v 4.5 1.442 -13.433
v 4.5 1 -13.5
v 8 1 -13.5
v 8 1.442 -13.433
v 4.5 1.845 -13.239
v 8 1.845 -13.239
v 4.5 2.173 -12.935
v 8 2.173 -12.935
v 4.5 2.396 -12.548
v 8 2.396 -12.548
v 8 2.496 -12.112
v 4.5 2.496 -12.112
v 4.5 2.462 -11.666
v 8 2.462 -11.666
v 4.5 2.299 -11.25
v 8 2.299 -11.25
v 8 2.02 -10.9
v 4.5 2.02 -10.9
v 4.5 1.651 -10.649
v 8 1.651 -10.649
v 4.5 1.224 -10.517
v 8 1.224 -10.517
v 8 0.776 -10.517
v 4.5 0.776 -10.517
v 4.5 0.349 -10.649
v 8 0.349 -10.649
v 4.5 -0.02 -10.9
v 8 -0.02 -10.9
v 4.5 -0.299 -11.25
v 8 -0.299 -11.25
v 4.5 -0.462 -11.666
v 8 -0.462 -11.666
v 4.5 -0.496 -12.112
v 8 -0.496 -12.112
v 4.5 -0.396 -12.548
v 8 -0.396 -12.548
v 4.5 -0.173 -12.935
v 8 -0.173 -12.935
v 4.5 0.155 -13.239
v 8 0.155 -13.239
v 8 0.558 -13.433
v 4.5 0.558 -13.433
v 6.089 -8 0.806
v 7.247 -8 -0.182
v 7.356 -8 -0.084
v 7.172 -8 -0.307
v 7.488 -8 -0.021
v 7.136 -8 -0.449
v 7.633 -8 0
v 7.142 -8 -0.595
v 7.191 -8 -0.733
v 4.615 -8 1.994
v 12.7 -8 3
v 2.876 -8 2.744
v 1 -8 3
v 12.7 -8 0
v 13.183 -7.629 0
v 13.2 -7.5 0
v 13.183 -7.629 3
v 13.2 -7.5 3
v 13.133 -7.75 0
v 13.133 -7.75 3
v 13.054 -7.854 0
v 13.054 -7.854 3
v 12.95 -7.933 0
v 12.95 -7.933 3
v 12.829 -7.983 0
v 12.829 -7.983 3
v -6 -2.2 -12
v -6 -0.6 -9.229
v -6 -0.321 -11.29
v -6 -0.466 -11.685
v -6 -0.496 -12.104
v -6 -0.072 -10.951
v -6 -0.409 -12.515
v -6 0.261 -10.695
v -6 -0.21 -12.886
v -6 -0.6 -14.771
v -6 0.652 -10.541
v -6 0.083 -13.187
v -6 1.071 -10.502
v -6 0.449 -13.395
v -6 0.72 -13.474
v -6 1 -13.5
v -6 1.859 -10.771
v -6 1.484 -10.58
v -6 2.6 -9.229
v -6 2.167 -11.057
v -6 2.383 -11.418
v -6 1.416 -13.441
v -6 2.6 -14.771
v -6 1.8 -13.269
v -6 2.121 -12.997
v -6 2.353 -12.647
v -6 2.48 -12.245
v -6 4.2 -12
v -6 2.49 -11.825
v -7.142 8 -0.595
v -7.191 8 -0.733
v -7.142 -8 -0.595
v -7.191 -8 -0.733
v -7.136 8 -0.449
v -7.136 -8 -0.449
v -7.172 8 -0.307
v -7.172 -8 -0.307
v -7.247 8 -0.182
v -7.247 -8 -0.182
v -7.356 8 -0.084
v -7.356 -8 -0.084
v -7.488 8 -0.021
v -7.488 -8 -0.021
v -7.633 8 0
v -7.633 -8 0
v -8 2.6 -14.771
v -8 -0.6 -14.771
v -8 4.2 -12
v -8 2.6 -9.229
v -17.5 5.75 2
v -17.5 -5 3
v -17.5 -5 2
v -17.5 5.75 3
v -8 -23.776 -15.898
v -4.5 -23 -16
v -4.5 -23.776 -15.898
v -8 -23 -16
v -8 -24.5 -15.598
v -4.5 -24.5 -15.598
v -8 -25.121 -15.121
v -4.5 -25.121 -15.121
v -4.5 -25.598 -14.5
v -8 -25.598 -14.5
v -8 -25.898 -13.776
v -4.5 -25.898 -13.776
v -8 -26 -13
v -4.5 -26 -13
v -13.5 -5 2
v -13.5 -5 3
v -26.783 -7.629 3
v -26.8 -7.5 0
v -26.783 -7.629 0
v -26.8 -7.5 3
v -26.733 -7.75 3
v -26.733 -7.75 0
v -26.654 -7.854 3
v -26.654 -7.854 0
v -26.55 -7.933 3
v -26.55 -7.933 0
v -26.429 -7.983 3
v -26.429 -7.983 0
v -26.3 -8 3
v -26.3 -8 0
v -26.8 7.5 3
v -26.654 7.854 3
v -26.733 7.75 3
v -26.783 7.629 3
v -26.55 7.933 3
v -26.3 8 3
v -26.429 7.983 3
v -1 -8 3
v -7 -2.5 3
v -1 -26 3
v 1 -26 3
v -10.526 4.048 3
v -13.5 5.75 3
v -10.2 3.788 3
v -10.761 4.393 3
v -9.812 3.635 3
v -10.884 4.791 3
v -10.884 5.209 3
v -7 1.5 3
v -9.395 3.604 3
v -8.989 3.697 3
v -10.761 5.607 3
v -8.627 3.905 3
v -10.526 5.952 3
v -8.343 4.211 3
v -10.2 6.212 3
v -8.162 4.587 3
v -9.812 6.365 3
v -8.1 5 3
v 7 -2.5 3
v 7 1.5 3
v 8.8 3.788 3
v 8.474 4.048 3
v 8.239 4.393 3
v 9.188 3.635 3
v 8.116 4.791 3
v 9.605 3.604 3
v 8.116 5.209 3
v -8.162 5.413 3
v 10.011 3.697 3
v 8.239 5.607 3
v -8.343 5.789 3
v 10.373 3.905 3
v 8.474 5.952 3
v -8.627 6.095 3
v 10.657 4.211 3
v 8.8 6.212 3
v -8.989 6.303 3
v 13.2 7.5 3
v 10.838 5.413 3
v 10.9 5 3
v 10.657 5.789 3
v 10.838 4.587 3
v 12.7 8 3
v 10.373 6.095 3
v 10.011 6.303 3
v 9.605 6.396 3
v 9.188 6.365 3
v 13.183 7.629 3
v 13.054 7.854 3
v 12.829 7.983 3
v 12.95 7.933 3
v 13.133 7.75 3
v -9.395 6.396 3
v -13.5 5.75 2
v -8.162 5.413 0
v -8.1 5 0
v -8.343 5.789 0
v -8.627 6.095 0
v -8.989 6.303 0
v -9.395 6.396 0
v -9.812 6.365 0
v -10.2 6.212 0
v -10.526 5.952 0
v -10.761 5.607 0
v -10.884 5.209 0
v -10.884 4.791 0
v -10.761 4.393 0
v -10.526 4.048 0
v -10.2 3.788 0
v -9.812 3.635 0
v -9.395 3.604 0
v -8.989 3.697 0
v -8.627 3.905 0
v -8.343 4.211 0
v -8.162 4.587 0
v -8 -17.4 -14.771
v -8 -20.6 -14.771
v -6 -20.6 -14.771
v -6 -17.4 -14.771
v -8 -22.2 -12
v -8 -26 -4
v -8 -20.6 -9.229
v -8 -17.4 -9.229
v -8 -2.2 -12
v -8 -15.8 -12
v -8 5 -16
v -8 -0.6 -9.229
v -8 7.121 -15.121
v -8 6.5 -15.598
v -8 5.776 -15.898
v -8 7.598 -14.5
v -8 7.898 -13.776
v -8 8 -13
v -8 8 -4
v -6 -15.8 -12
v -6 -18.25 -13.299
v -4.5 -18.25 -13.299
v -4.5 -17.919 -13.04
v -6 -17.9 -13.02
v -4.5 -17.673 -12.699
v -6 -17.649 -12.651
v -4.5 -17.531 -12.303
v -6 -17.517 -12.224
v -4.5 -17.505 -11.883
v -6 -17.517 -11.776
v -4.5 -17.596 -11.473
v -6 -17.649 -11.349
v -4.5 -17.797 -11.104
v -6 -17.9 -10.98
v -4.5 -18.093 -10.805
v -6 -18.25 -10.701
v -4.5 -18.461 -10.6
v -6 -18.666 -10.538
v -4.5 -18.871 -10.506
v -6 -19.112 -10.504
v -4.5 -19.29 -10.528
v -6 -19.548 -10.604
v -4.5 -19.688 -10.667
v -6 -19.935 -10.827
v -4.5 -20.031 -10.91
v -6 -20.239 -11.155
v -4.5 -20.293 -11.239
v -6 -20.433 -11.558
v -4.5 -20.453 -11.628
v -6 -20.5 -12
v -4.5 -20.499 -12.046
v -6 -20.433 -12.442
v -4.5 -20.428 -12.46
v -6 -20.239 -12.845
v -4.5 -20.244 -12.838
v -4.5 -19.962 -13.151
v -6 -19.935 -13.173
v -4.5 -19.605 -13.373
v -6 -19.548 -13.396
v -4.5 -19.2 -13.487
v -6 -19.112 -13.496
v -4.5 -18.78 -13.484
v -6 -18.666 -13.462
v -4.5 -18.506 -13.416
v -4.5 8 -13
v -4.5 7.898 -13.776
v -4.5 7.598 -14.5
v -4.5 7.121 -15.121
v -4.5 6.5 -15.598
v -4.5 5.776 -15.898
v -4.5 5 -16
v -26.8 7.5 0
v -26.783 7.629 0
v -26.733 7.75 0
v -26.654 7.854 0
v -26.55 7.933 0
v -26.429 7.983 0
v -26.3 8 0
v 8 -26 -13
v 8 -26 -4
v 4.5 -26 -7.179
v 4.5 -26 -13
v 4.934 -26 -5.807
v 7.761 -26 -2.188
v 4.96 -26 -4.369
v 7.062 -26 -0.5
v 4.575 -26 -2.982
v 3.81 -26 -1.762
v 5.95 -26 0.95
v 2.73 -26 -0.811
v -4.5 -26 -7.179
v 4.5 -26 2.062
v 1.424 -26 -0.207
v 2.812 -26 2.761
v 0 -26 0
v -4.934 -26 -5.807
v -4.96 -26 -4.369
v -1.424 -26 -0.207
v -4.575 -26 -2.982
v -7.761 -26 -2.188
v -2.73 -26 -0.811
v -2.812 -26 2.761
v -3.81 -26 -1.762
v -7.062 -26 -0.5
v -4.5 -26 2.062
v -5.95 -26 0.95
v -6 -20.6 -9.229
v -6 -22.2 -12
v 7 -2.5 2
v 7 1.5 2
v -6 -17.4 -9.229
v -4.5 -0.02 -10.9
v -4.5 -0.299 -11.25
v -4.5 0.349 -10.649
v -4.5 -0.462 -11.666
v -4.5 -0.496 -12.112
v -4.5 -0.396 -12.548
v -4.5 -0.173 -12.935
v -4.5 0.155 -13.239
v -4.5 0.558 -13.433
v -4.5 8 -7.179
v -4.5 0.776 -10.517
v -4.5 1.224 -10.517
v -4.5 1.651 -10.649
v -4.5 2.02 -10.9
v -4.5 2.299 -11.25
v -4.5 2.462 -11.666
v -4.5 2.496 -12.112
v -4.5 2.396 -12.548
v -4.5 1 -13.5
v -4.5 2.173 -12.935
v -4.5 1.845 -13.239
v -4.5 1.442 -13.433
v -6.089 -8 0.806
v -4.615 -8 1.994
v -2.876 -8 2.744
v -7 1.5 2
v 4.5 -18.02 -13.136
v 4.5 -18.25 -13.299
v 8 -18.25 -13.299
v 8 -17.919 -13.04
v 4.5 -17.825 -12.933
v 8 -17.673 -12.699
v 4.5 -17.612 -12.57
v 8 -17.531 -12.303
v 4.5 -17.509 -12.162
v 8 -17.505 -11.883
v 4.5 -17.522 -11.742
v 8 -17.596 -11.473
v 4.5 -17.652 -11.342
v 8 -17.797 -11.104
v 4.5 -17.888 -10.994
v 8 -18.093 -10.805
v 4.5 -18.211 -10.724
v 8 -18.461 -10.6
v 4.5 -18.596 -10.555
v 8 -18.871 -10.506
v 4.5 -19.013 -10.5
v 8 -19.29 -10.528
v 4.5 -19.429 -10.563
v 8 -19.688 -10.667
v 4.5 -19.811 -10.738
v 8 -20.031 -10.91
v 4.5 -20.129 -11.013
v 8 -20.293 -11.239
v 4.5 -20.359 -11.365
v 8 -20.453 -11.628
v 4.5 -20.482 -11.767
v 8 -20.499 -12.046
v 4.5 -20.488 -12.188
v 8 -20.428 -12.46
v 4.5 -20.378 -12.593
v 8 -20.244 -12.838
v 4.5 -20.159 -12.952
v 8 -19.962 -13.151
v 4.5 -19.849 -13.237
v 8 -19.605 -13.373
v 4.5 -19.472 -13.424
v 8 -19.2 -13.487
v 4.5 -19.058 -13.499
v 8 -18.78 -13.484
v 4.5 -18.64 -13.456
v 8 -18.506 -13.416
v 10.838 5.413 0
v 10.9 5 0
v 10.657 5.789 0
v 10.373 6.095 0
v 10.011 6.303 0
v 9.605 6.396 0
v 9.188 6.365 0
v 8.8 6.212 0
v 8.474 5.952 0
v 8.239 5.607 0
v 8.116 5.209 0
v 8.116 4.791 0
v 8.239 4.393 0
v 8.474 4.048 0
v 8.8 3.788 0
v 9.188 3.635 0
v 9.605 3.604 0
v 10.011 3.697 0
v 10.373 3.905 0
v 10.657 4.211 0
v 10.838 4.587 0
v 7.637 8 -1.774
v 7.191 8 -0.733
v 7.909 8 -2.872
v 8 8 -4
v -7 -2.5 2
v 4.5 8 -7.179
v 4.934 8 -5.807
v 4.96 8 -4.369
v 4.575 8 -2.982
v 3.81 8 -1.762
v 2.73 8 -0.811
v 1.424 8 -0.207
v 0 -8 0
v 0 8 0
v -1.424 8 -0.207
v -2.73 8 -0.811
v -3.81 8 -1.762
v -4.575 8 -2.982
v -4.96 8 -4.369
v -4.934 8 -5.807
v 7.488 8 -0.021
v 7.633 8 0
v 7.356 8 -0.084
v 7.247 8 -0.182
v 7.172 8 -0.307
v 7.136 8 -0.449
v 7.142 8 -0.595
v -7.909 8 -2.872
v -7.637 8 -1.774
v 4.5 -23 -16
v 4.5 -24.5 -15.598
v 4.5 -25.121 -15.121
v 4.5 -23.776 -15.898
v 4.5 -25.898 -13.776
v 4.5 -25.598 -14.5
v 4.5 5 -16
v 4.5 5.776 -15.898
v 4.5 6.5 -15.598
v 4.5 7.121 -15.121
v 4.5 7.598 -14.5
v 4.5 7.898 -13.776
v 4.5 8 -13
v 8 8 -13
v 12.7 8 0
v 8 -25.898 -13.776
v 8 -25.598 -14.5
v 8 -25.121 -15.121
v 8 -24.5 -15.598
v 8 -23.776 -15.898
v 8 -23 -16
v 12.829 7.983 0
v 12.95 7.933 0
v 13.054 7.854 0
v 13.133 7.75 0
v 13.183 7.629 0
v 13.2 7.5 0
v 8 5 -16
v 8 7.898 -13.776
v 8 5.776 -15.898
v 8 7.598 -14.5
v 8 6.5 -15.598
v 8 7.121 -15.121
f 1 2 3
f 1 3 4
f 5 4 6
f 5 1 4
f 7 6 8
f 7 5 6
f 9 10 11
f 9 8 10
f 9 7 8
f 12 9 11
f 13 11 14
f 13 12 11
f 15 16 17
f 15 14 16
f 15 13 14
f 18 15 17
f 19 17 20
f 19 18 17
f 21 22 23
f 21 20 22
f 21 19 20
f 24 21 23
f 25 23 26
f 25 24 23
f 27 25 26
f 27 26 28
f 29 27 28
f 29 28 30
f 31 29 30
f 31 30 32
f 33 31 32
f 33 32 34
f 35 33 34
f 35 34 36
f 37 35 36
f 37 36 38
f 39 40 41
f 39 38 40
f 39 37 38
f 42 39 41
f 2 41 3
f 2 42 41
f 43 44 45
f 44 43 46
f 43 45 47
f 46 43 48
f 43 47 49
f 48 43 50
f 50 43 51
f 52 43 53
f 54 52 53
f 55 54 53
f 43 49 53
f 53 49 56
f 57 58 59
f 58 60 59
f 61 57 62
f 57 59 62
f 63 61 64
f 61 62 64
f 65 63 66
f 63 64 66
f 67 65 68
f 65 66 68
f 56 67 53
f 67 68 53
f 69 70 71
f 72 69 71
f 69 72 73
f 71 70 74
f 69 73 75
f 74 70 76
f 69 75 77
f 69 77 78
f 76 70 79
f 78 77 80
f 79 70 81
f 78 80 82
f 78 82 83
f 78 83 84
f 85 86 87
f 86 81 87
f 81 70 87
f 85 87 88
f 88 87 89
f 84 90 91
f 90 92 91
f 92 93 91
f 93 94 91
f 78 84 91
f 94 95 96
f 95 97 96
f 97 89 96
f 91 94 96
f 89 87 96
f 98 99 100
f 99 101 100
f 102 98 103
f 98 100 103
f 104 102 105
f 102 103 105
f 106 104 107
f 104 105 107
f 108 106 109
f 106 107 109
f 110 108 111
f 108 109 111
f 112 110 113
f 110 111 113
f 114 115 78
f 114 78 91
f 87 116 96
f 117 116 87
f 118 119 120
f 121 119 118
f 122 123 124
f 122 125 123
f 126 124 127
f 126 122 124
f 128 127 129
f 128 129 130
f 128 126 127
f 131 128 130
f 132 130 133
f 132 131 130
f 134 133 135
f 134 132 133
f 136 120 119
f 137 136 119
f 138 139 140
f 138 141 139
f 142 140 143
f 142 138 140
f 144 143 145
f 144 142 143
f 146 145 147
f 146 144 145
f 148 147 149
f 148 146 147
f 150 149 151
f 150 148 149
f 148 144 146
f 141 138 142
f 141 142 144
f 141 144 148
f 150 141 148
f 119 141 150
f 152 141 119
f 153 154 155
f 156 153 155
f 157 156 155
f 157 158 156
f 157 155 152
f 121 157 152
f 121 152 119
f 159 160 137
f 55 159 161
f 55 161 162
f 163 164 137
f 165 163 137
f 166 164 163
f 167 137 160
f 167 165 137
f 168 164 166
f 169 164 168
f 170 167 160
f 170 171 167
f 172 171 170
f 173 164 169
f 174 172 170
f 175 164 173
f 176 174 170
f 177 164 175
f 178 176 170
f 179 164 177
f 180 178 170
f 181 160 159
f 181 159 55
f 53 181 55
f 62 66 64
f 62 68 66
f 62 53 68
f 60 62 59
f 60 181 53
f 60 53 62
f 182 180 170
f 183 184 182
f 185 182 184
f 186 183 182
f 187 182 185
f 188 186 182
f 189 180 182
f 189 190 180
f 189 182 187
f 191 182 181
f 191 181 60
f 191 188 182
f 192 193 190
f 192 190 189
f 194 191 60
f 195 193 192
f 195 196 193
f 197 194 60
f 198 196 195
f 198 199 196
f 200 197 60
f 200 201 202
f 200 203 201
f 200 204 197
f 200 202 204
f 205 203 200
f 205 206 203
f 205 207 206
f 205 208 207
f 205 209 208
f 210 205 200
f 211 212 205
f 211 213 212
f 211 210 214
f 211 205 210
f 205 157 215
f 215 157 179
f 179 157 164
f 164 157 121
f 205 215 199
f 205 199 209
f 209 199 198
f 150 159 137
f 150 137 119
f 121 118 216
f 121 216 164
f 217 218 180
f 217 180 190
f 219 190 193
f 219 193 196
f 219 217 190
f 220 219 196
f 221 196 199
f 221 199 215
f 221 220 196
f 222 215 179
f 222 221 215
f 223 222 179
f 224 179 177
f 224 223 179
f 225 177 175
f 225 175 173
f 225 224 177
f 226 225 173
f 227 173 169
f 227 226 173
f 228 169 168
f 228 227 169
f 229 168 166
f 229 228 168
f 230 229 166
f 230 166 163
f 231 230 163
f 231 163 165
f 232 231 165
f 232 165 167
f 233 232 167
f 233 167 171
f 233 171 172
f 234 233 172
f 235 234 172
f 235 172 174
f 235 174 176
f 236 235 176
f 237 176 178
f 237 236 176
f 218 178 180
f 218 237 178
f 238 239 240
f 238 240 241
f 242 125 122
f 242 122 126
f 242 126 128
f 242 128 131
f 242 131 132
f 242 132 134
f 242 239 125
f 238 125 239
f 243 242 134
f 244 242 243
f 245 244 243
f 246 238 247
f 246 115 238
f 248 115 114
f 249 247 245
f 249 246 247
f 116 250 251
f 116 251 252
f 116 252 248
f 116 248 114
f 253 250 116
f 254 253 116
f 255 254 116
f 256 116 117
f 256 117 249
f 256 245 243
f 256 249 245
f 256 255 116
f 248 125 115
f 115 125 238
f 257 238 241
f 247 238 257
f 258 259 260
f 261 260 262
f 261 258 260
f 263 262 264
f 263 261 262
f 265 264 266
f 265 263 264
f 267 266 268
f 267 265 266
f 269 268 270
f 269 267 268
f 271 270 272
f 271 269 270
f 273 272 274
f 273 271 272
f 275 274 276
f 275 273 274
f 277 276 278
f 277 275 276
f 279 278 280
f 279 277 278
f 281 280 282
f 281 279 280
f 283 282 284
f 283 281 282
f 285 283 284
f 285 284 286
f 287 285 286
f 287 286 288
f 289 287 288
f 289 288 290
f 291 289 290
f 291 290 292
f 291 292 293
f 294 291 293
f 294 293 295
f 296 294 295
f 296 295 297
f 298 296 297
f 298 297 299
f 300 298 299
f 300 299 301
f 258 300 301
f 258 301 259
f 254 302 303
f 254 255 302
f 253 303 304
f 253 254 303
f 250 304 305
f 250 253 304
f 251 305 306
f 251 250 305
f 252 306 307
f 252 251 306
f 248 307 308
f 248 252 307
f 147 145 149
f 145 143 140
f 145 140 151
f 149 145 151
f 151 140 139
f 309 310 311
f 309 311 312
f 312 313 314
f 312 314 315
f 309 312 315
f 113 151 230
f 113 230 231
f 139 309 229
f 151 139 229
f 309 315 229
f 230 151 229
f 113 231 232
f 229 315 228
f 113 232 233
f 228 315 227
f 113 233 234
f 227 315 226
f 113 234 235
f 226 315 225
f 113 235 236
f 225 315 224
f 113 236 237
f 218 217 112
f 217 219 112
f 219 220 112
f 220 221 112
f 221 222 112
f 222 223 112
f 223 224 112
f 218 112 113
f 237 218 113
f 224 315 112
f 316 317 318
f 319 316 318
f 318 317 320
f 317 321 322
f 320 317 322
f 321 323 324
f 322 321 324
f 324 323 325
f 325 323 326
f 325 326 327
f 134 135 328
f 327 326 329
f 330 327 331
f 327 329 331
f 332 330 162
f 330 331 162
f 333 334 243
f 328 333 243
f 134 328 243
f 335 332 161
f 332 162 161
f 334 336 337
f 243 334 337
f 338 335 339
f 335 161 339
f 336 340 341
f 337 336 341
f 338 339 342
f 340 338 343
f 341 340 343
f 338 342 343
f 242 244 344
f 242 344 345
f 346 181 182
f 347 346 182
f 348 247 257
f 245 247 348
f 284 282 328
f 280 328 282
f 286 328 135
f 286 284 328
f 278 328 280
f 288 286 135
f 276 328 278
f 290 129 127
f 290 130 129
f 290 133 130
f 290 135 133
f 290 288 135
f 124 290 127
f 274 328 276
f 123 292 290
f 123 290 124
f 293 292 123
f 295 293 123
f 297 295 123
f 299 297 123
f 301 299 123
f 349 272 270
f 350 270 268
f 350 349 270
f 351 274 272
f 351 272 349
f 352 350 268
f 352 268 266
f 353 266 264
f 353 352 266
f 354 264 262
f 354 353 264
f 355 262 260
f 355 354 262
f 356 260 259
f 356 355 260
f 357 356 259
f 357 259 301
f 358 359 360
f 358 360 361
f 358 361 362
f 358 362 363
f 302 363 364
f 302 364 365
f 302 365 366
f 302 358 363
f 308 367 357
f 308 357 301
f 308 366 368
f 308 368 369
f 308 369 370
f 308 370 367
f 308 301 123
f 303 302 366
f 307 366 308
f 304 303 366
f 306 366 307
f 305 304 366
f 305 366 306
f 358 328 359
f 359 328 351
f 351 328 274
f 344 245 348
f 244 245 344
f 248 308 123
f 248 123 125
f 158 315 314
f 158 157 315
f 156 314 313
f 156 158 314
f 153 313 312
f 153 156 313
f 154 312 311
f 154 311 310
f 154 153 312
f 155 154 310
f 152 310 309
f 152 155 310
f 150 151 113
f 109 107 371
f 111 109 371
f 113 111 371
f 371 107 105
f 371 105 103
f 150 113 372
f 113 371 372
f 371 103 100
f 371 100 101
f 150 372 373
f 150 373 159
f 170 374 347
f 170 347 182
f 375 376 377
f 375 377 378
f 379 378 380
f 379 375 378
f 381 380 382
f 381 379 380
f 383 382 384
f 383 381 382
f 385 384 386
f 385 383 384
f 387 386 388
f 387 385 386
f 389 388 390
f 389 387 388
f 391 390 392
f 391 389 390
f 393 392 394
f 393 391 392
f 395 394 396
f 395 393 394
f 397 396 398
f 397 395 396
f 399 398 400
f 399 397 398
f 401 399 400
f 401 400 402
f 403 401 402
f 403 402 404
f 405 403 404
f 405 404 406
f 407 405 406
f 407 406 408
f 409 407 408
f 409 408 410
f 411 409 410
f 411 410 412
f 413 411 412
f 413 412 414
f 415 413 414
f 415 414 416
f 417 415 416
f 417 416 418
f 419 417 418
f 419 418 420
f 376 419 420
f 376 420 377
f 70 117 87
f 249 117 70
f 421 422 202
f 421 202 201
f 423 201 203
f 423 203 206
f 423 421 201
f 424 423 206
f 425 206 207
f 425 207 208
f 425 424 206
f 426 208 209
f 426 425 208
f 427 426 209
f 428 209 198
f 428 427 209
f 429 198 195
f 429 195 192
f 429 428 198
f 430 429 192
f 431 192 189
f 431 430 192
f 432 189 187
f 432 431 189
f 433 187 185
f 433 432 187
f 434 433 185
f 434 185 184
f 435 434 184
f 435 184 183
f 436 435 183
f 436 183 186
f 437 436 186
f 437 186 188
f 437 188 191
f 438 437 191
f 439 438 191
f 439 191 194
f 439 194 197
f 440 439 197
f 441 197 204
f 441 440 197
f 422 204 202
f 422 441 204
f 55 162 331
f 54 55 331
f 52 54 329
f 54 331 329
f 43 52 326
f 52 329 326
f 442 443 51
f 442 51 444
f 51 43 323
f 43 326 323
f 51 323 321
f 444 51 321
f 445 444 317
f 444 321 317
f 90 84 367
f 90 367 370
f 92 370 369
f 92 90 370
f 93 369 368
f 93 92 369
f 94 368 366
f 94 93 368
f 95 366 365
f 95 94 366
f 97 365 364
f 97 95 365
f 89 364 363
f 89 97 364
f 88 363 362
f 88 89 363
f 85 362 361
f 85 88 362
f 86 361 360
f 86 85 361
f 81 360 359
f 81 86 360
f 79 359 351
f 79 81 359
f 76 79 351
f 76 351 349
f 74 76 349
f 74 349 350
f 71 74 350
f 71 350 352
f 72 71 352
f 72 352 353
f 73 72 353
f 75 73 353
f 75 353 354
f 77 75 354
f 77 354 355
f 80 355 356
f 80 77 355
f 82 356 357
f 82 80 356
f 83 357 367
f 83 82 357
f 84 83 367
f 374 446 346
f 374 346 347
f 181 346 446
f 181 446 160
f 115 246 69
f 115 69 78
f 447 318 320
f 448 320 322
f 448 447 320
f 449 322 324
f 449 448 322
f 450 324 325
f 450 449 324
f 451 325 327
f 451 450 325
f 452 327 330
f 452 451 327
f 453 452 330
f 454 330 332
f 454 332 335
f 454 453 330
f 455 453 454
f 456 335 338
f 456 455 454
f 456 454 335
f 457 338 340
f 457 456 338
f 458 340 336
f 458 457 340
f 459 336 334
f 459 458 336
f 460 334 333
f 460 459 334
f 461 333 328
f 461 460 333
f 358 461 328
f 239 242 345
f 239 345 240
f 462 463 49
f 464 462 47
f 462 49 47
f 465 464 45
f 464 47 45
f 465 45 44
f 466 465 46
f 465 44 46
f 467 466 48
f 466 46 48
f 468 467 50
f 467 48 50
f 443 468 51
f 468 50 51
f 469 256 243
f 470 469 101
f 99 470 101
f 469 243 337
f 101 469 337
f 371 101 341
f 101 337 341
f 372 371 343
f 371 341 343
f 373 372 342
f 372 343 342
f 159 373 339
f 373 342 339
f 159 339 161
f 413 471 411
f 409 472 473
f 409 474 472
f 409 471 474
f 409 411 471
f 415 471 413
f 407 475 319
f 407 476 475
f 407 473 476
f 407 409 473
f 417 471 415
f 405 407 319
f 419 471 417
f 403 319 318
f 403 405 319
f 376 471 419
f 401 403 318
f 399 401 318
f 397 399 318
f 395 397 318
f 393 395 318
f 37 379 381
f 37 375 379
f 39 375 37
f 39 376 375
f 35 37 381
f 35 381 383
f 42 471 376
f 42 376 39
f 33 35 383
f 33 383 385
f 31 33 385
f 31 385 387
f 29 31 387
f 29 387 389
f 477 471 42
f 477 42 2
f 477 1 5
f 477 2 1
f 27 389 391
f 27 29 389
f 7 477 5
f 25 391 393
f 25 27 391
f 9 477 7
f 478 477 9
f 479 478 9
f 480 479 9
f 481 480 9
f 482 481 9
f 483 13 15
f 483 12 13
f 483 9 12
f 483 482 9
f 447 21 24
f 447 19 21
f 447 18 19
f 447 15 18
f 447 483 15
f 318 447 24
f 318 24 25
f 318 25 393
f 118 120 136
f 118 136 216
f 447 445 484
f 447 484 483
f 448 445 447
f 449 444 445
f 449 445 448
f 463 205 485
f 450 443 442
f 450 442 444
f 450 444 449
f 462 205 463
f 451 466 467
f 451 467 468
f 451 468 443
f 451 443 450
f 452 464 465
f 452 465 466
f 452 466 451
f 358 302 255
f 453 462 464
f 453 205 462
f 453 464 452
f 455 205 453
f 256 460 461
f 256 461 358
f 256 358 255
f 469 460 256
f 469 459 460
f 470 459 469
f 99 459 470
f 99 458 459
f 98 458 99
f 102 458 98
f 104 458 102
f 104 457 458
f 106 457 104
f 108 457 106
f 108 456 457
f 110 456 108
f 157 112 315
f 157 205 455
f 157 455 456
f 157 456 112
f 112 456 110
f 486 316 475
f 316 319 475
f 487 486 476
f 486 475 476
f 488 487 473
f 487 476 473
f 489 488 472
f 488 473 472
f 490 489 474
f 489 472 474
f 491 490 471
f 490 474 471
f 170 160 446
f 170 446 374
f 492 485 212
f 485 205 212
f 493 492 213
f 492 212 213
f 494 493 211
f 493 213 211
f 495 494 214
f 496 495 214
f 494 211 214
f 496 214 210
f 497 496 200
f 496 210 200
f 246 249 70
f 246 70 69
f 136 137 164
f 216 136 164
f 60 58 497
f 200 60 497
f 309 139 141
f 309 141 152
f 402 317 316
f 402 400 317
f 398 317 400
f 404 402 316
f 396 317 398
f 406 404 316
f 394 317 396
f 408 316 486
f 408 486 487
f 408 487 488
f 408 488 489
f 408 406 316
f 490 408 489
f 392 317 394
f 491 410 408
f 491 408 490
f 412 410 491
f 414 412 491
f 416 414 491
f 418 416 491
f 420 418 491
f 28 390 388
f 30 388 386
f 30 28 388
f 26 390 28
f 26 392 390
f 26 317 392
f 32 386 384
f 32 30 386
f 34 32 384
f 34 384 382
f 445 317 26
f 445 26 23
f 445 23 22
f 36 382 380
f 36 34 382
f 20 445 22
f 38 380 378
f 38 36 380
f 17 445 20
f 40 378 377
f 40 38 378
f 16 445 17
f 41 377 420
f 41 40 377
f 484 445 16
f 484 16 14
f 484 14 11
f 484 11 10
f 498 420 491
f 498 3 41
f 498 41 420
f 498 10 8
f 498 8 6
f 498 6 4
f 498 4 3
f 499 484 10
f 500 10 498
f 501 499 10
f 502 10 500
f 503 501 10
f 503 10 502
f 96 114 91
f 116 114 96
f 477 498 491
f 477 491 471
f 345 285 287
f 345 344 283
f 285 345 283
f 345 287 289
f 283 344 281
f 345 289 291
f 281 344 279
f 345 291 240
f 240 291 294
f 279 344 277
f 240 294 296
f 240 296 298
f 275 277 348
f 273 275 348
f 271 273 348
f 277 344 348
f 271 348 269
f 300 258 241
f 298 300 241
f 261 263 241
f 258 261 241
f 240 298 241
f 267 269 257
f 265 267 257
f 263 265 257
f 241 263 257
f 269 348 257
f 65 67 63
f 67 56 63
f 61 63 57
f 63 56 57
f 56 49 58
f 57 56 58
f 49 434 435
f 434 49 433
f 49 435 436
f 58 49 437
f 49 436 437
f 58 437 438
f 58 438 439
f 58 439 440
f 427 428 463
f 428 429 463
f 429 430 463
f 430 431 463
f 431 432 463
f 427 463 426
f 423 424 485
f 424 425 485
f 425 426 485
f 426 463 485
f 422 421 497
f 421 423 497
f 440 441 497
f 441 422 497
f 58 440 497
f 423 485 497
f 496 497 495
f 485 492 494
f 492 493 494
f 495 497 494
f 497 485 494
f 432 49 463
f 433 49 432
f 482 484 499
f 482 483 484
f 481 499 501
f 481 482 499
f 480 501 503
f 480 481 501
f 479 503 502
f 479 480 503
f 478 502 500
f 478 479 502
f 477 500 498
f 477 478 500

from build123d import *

# Parameters (mm, degrees)
BOX039_W                    = 10.75
BOX039_H                    = 10
BOX039_DEPTH                = 4
BOX038_W                    = 4
BOX038_H                    = 10
BOX038_DEPTH                = 14
FUSION038_ROLL_ANGLE        = 90
FUSION038_PLACEMENT_ANGLE   = 90
PRISM001_DEPTH              = 10
PRISM001_ROLL_ANGLE         = 90.000052
PRISM001_PITCH_ANGLE        = 59.999967
PRISM001_PLACEMENT_ANGLE    = 90.000052
CYLINDER040_R               = 1.5
CYLINDER040_DEPTH           = 28
CYLINDER040_ROLL_ANGLE      = 90.000052
CYLINDER040_PITCH_ANGLE     = 59.999967
CYLINDER040_PLACEMENT_ANGLE = 90.000052
CYLINDER039_R               = 1.5
CYLINDER039_DEPTH           = 28
CYLINDER039_PITCH_ANGLE     = 90
PRISM002_DEPTH              = 10
PRISM002_ROLL_ANGLE         = 90.000052
PRISM002_PITCH_ANGLE        = 59.999967
PRISM002_PLACEMENT_ANGLE    = 90.000052
PAD019_DEPTH                = 34
FILLET031_R                 = 7
FILLET032_R                 = 3
SKETCH021_W                 = 40
SKETCH021_H                 = 16
SKETCH021_R                 = 1.4
PAD018_DEPTH                = 3
FILLET033_R                 = 0.5


with BuildPart() as cube039:
    # Box039 → Box039 (new body)
    with BuildSketch(Plane(origin=(-5, -3, -10.5), x_dir=(1, 0, 0), z_dir=(0, 0, 1))):
        with Locations((5.375, 5)):
            Rectangle(BOX039_W, BOX039_H)
    extrude(amount=BOX039_DEPTH)


with BuildPart() as fusion038:
    # Box038 → Box038 (new body)
    with BuildSketch(Plane(origin=(-2.5, -3, 0), x_dir=(1, 0, 0), z_dir=(0, 0, 1))):
        with Locations((2, 5)):
            Rectangle(BOX038_W, BOX038_H)
    extrude(amount=BOX038_DEPTH)

    # Fusion038: union Cube039
    add(cube039.part)


with BuildPart() as fusion038_1:
    # Fusion038 roll: moved
    add(fusion038.part.rotate(Axis((0, 0, 0), (1, 0, 0)), FUSION038_ROLL_ANGLE))


with BuildPart() as fusion038_2:
    # Fusion038 placement: moved
    add(fusion038_1.part.moved(Location((-7, 0, 5))).rotate(Axis((-7, 0, 5), (0, 0, 1)), FUSION038_PLACEMENT_ANGLE))


with BuildPart() as prism001:
    # Prism001 → Prism001 (new body)
    with BuildSketch(Plane.XY):
        Polygon((3.2, 0), (1.6, 2.771281), (-1.6, 2.771281), (-3.2, 0), (-1.6, -2.771281), (1.6, -2.771281), align=None)
    extrude(amount=PRISM001_DEPTH)


with BuildPart() as prism001_1:
    # Prism001 roll: moved
    add(prism001.part.rotate(Axis((0, 0, 0), (1, 0, 0)), PRISM001_ROLL_ANGLE))


with BuildPart() as prism001_2:
    # Prism001 pitch: moved
    add(prism001_1.part.rotate(Axis((0, 0, 0), (0, 1, 0)), PRISM001_PITCH_ANGLE))


with BuildPart() as prism001_3:
    # Prism001 placement: moved
    add(prism001_2.part.moved(Location((-16, -19, -12))).rotate(Axis((-16, -19, -12), (0, 0, 1)), PRISM001_PLACEMENT_ANGLE))


with BuildPart() as cylinder040:
    # Cylinder040 → Cylinder040 (new body)
    with BuildSketch(Plane.XY):
        Circle(CYLINDER040_R)
    extrude(amount=CYLINDER040_DEPTH)


with BuildPart() as cylinder040_1:
    # Cylinder040 roll: moved
    add(cylinder040.part.rotate(Axis((0, 0, 0), (1, 0, 0)), CYLINDER040_ROLL_ANGLE))


with BuildPart() as cylinder040_2:
    # Cylinder040 pitch: moved
    add(cylinder040_1.part.rotate(Axis((0, 0, 0), (0, 1, 0)), CYLINDER040_PITCH_ANGLE))


with BuildPart() as cylinder040_3:
    # Cylinder040 placement: moved
    add(cylinder040_2.part.moved(Location((-16, -19, -12))).rotate(Axis((-16, -19, -12), (0, 0, 1)), CYLINDER040_PLACEMENT_ANGLE))


with BuildPart() as cylinder039:
    # Cylinder039 → Cylinder039 (new body)
    with BuildSketch(Plane.XY):
        Circle(CYLINDER039_R)
    extrude(amount=CYLINDER039_DEPTH)


with BuildPart() as cylinder039_1:
    # Cylinder039 pitch: moved
    add(cylinder039.part.rotate(Axis((0, 0, 0), (0, 1, 0)), CYLINDER039_PITCH_ANGLE))


with BuildPart() as cylinder039_2:
    # Cylinder039 placement: moved
    add(cylinder039_1.part.moved(Location((-12, 1, -12))))


with BuildPart() as fusion037:
    # Prism002 → Prism002 (new body)
    with BuildSketch(Plane.XY):
        Polygon((3.2, 0), (1.6, 2.771281), (-1.6, 2.771281), (-3.2, 0), (-1.6, -2.771281), (1.6, -2.771281), align=None)
    extrude(amount=PRISM002_DEPTH)


with BuildPart() as fusion037_1:
    # Prism002 roll: moved
    add(fusion037.part.rotate(Axis((0, 0, 0), (1, 0, 0)), PRISM002_ROLL_ANGLE))


with BuildPart() as fusion037_2:
    # Prism002 pitch: moved
    add(fusion037_1.part.rotate(Axis((0, 0, 0), (0, 1, 0)), PRISM002_PITCH_ANGLE))


with BuildPart() as fusion037_3:
    # Prism002 placement: moved
    add(fusion037_2.part.moved(Location((-16, 1, -12))).rotate(Axis((-16, 1, -12), (0, 0, 1)), PRISM002_PLACEMENT_ANGLE))

    # Fusion037: union Prism001, Cylinder040, Cylinder039
    add(prism001_3.part)
    add(cylinder040_3.part)
    add(cylinder039_2.part)


with BuildPart() as fillet032:
    # Sketch022 → Pad019 (new body)
    with BuildSketch(Plane.XZ.offset(-8)):
        with BuildLine():
            Line((-8, -16), (-8, 3))
            Line((-8, 3), (8, 3))
            Line((8, 3), (8, -16))
            Line((8, -16), (4.5, -16))
            Line((4.5, -16), (4.5, -7.179449))
            ThreePointArc((4.5, -7.179449), (0, 0), (-4.5, -7.179449))
            Line((-4.5, -7.179449), (-4.5, -16))
            Line((-4.5, -16), (-8, -16))
        make_face()
    extrude(amount=PAD019_DEPTH)

    # Fillet031
    fillet031_edges = [fillet032.edges().sort_by_distance(p)[0] for p in [
        (-8, -9, 3),
        (8, -9, 3),
    ]]
    fillet(fillet031_edges, radius=FILLET031_R)

    # Fillet032
    fillet032_edges = [fillet032.edges().sort_by_distance(p)[0] for p in [
        (-6.25, 8, -16),
        (6.25, 8, -16),
        (-6.25, -26, -16),
        (6.25, -26, -16),
    ]]
    fillet(fillet032_edges, radius=FILLET032_R)


with BuildPart() as cut042:
    # Sketch021 → Pad018 (new body)
    with BuildSketch(Plane.XY):
        with Locations((-6.8, 0)):
            Rectangle(SKETCH021_W, SKETCH021_H)
        with Locations((-9.5, 5)):
            Circle(SKETCH021_R, mode=Mode.SUBTRACT)
        with Locations((9.5, 5)):
            Circle(SKETCH021_R, mode=Mode.SUBTRACT)
    extrude(amount=PAD018_DEPTH)

    # Fusion036: union Fillet032
    add(fillet032.part)

    # Cut041: cut Fusion037
    add(fusion037_3.part, mode=Mode.SUBTRACT)

    # Fillet033
    fillet033_edges = [cut042.edges().sort_by_distance(p)[0] for p in [
        (-26.8, -8, 1.5),
        (-26.8, 8, 1.5),
        (13.2, 8, 1.5),
        (-6.744563, 0, 0),
        (13.2, -8, 1.5),
        (6.744563, 0, 0),
    ]]
    fillet(fillet033_edges, radius=FILLET033_R)

    # Cut042: cut Fusion038
    add(fusion038_2.part, mode=Mode.SUBTRACT)


solid = cut042.part
